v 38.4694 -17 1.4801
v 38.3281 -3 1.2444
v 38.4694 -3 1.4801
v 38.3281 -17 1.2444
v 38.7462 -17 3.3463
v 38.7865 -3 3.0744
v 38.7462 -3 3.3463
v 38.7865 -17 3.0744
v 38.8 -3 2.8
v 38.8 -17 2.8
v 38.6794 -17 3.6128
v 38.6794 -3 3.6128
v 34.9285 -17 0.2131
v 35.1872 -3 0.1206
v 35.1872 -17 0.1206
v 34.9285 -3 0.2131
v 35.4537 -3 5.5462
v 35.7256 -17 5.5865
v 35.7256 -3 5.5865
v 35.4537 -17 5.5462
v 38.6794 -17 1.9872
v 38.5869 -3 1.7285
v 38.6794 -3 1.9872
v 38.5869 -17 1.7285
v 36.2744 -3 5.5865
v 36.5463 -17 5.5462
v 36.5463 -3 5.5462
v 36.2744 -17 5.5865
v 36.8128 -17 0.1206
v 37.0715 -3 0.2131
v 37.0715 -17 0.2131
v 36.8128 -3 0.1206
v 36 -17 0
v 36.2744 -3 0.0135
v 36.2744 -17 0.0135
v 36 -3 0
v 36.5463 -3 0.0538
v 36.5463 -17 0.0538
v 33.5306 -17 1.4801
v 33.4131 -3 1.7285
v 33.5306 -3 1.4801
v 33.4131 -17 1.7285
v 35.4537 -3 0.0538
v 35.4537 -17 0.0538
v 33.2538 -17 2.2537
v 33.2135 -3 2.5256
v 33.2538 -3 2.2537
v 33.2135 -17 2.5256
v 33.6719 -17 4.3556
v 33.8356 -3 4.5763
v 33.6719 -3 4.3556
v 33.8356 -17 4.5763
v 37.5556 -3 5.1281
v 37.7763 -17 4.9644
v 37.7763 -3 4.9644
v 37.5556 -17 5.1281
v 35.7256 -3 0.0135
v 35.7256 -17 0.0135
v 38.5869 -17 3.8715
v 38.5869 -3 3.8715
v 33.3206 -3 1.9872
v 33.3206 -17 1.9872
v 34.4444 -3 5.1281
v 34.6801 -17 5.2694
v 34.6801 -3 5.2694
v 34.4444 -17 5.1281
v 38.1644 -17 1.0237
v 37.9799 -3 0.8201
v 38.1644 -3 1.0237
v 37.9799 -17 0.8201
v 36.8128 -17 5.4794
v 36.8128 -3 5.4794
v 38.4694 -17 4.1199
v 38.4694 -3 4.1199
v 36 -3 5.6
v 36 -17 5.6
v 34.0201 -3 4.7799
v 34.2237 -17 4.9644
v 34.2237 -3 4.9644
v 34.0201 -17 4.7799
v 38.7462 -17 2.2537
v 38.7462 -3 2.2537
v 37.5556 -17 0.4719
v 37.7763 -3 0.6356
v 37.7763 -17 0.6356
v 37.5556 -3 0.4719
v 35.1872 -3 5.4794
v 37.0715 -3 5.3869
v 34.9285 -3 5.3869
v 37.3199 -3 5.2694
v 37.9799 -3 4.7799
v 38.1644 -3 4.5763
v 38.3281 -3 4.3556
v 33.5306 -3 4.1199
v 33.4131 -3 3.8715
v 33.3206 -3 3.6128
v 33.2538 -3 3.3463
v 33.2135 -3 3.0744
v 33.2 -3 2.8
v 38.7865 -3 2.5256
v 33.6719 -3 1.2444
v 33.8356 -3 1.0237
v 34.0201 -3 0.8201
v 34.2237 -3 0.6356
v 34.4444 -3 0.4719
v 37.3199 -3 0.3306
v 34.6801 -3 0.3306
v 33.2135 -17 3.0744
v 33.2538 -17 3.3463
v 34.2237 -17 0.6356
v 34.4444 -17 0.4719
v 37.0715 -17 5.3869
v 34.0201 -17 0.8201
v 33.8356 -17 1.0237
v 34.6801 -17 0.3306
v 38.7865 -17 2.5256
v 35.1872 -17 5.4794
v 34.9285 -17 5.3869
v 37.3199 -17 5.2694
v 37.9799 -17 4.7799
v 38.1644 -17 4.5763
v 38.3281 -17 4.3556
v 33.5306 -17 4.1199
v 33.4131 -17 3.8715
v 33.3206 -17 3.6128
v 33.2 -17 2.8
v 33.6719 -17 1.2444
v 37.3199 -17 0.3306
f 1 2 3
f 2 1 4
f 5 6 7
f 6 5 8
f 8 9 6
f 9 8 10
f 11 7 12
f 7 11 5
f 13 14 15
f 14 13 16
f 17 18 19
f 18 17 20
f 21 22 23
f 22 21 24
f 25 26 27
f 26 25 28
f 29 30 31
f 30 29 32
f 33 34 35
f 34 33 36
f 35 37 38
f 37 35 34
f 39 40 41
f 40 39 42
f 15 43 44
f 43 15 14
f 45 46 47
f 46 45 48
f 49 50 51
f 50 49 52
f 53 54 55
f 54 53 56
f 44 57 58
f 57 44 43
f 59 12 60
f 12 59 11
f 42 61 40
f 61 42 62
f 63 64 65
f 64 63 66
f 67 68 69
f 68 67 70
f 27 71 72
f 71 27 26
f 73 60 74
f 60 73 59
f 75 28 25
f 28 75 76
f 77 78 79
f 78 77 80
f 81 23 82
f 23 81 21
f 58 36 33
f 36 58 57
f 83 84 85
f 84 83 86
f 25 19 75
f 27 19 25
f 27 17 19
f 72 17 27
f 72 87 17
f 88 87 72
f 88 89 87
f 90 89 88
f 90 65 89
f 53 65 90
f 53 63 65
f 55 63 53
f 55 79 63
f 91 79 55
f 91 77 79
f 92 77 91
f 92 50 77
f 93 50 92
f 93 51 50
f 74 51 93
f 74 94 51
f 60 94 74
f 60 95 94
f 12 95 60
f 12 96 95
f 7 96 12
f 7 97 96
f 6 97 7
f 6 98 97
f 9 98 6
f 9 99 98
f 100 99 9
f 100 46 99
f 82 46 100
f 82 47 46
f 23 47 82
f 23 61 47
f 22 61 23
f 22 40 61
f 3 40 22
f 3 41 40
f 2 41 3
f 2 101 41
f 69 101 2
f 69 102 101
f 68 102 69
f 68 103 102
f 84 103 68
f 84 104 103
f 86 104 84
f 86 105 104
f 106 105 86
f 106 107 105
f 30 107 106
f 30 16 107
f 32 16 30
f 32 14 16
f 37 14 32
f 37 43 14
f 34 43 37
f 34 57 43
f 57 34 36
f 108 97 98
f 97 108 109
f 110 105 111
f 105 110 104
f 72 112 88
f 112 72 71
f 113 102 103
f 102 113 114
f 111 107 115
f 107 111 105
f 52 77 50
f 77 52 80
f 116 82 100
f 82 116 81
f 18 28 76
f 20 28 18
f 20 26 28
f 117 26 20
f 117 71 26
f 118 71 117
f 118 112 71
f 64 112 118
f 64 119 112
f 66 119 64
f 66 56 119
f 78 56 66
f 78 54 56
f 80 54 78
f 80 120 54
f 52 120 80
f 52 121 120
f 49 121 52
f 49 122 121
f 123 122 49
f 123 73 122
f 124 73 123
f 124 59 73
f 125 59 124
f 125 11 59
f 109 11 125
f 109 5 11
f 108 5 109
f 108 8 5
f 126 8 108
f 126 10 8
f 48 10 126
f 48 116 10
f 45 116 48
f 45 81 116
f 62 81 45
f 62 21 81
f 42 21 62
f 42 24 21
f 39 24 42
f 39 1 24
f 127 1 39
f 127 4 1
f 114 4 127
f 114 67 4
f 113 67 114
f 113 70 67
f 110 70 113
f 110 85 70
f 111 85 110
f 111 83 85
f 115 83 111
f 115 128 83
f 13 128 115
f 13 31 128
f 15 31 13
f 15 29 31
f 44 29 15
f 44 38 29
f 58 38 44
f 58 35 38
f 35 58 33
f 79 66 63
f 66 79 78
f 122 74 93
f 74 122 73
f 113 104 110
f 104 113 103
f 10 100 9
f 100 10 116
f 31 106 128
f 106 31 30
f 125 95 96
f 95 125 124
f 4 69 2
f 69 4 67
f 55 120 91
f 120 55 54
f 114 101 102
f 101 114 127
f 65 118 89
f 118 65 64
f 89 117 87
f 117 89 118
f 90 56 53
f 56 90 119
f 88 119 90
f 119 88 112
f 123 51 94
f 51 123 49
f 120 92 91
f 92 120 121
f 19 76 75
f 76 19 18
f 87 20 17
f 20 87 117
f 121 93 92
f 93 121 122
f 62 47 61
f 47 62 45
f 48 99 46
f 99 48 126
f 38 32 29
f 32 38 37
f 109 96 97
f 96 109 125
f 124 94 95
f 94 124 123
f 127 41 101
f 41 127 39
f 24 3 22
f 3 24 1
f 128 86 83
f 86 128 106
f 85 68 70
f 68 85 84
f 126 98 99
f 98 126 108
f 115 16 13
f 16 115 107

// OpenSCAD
// file: ../lib/soldier.scad
// toy-soldiers shared library
// All figures and weapons include this file. The grip interface constants
// are the contract: any weapon whose bar uses GRIP_BAR_D fits any figure
// whose hand uses GRIP_HOLE_D / GRIP_SLOT_W.

$fn = $preview ? 32 : 64;

// ---------------------------------------------------------------
// Grip interface — shared contract between figures and weapons
// ---------------------------------------------------------------
GRIP_BAR_D  = 5.6;  // weapon grip-bar diameter
GRIP_HOLE_D = 6.0;  // hand hole diameter (0.4mm clearance for FDM)
GRIP_SLOT_W = 5.3;  // C-opening width; bar snaps through the front
HAND_OD     = 11;   // hand outer diameter
HAND_H      = 9;    // hand height
GRIP_BAR_L  = 14;   // standard bar length (sticks out below the hand)

// ---------------------------------------------------------------
// Figure proportions (~70mm tall incl. base, +Y is forward)
// ---------------------------------------------------------------
BASE_D  = 26;  BASE_H  = 4;
LEG_H   = 22;  LEG_D   = 9;  HIP_X = 5.5;   // leg centre offset from middle
TORSO_H = 24;  TORSO_W = 20; TORSO_WAIST = 16; TORSO_D = 12;
HEAD_D  = 14;  NECK_H  = 3;

HIP_Z      = BASE_H + LEG_H;                 // 26
TORSO_Z0   = HIP_Z - 1;                      // torso overlaps hips 1mm
TORSO_Z1   = TORSO_Z0 + TORSO_H;             // 49
SHOULDER_Z = TORSO_Z1 - 3;                   // 46
SHOULDER_X = TORSO_W/2 + 1;                  // arm root
HEAD_CZ    = TORSO_Z1 + NECK_H + HEAD_D/2;   // head centre

// ---------------------------------------------------------------
// Primitives
// ---------------------------------------------------------------
module rounded_box(size, r=2)
    hull()
        for (x=[-1,1], y=[-1,1], z=[-1,1])
            translate([x*(size[0]/2-r), y*(size[1]/2-r), z*(size[2]/2-r)])
                sphere(r=r);

module limb(a, b, ra=4.5, rb=4)   // thick tapered limb between two points
    hull() { translate(a) sphere(r=ra); translate(b) sphere(r=rb); }

// ---------------------------------------------------------------
// Body parts
// ---------------------------------------------------------------
module base()
    cylinder(d1=BASE_D, d2=BASE_D-2, h=BASE_H);

module leg(x)
    union() {
        translate([x, 0, BASE_H-1]) cylinder(d=LEG_D, h=LEG_H+2);
        // boot: rests on the base, so no overhang
        translate([x, 3.5, BASE_H + 2.5]) rounded_box([LEG_D+1, 13, 5], 2);
    }

module torso()
    hull() {
        translate([0, 0, TORSO_Z0 + 2])
            rounded_box([TORSO_WAIST, TORSO_D-1, 4], 2);
        translate([0, 0, TORSO_Z1 - 2.5])
            rounded_box([TORSO_W, TORSO_D, 5], 2);
    }

module head() {
    // stout neck; the sphere's underside meets it at <45deg so no supports
    translate([0, 0, TORSO_Z1 - 1]) cylinder(d=9.5, h=NECK_H + 3);
    translate([0, 0, HEAD_CZ]) sphere(d=HEAD_D);
}

module helmet()
    translate([0, 0, HEAD_CZ + 1]) {
        difference() {
            sphere(d=HEAD_D + 3.5);
            translate([0, 0, -HEAD_D/2]) cube(HEAD_D*2, center=true);
        }
        // brim with 45-degree underside chamfer
        cylinder(d1=HEAD_D + 1, d2=HEAD_D + 5, h=2);
    }

module cap()   // officer's peaked cap
    translate([0, 0, HEAD_CZ + HEAD_D/2 - 3.5]) {
        cylinder(d1=HEAD_D - 0.5, d2=HEAD_D + 1.5, h=4);
        translate([0, 0, 4]) cylinder(d=HEAD_D + 2, h=1.5);
        // peak: wedge jutting over the face, 45deg chamfered underside
        hull() {
            translate([0, HEAD_D/2 - 2, 1.25]) cube([11, 2, 2.5], center=true);
            translate([0, HEAD_D/2 + 3, 2.25]) cube([9, 1, 1.2], center=true);
        }
    }

module backpack()
    translate([0, -TORSO_D/2, SHOULDER_Z - 6])
        hull() {   // sloped underside back to the torso — printable
            translate([0, -1, -4]) rounded_box([13, 2, 4], 1);
            translate([0, -4, 2]) rounded_box([14, 6, 10], 2);
        }

// C-shaped grip hand, hole axis vertical, opening faces +Y (forward)
module grip_hand()
    difference() {
        cylinder(d=HAND_OD, h=HAND_H, center=true);
        cylinder(d=GRIP_HOLE_D, h=HAND_H + 2, center=true);
        translate([0, HAND_OD/4 + 0.5, 0])
            cube([GRIP_SLOT_W, HAND_OD/2 + 2, HAND_H + 2], center=true);
    }

module fist()
    sphere(d=9);

// ---------------------------------------------------------------
// Arms — s = +1 right, -1 left. Poses avoid >45-degree overhangs.
// ---------------------------------------------------------------
module arm(s, pose) {
    sh = [s*SHOULDER_X, 0, SHOULDER_Z];

    if (pose == "grip_side") {          // hand at the hip
        w = [s*(SHOULDER_X + 3), 4, SHOULDER_Z - 14];
        limb(sh, w);
        translate(w + [0, 1, -4]) grip_hand();
    }
    else if (pose == "grip_forward") {  // hand forward at waist height
        w = [s*(SHOULDER_X + 1), 9, SHOULDER_Z - 12];
        limb(sh, w);
        translate(w + [0, 2, -4]) grip_hand();
    }
    else if (pose == "grip_up") {       // bent arm, hand at shoulder height
        e = [s*(SHOULDER_X + 2), 3, SHOULDER_Z - 11];
        w = [s*(SHOULDER_X + 2), 9, SHOULDER_Z - 2];
        limb(sh, e);
        limb(e, w, 4, 4);
        translate(w + [0, 2, 2]) grip_hand();
    }
    else if (pose == "fist_side") {
        w = [s*(SHOULDER_X + 3), 3, SHOULDER_Z - 15];
        limb(sh, w);
        translate(w + [0, 0, -3]) fist();
    }
    else if (pose == "fist_forward") {
        w = [s*(SHOULDER_X + 1), 8, SHOULDER_Z - 13];
        limb(sh, w);
        translate(w + [0, 2, -2]) fist();
    }
    else if (pose == "point_up") {      // raised arm, ~40 degrees off vertical
        w = [s*(SHOULDER_X + 5), 6, SHOULDER_Z + 9];
        limb(sh, w);
        translate(w) sphere(d=8);
        translate(w) rotate([-40, s*15, 0]) cylinder(d=5, h=7);
    }
}

// ---------------------------------------------------------------
// Assembled soldier
// ---------------------------------------------------------------
module soldier(right_arm="grip_side", left_arm="fist_side",
               headgear="helmet", pack=false) {
    base();
    leg(-HIP_X); leg(HIP_X);
    torso();
    head();
    if (headgear == "helmet") helmet();
    if (headgear == "cap") cap();
    if (pack) backpack();
    arm( 1, right_arm);
    arm(-1, left_arm);
}

// ---------------------------------------------------------------
// Weapon helper — weapons are modelled in PRINT orientation:
// lying flat on the bed (z=0), length along X, "up in use" is +Y.
// The bar rests tangent on the bed so nothing floats.
// ---------------------------------------------------------------
module grip_bar(x, y_top, len=GRIP_BAR_L)
    translate([x, y_top, GRIP_BAR_D/2])
        rotate([90, 0, 0]) cylinder(d=GRIP_BAR_D, h=len);
// main file
// Toy bazooka — shoulder tube for the heavy trooper, printed lying flat.
include <../lib/soldier.scad>

THK = 9;

module rrect(x0, y0, x1, y1, r=1.5)
    translate([(x0+x1)/2, (y0+y1)/2])
        offset(r=r) square([x1-x0-2*r, y1-y0-2*r], center=true);

linear_extrude(THK)
    union() {
        rrect( 0, -5, 64, 5, 3);    // main tube
        rrect(56, -7, 64, 7, 2);    // muzzle flare
        rrect( 0, -7,  6, 7, 2);    // exhaust flare
        rrect(26,  5, 32, 9);       // sight block
    }

grip_bar(36, -3);
